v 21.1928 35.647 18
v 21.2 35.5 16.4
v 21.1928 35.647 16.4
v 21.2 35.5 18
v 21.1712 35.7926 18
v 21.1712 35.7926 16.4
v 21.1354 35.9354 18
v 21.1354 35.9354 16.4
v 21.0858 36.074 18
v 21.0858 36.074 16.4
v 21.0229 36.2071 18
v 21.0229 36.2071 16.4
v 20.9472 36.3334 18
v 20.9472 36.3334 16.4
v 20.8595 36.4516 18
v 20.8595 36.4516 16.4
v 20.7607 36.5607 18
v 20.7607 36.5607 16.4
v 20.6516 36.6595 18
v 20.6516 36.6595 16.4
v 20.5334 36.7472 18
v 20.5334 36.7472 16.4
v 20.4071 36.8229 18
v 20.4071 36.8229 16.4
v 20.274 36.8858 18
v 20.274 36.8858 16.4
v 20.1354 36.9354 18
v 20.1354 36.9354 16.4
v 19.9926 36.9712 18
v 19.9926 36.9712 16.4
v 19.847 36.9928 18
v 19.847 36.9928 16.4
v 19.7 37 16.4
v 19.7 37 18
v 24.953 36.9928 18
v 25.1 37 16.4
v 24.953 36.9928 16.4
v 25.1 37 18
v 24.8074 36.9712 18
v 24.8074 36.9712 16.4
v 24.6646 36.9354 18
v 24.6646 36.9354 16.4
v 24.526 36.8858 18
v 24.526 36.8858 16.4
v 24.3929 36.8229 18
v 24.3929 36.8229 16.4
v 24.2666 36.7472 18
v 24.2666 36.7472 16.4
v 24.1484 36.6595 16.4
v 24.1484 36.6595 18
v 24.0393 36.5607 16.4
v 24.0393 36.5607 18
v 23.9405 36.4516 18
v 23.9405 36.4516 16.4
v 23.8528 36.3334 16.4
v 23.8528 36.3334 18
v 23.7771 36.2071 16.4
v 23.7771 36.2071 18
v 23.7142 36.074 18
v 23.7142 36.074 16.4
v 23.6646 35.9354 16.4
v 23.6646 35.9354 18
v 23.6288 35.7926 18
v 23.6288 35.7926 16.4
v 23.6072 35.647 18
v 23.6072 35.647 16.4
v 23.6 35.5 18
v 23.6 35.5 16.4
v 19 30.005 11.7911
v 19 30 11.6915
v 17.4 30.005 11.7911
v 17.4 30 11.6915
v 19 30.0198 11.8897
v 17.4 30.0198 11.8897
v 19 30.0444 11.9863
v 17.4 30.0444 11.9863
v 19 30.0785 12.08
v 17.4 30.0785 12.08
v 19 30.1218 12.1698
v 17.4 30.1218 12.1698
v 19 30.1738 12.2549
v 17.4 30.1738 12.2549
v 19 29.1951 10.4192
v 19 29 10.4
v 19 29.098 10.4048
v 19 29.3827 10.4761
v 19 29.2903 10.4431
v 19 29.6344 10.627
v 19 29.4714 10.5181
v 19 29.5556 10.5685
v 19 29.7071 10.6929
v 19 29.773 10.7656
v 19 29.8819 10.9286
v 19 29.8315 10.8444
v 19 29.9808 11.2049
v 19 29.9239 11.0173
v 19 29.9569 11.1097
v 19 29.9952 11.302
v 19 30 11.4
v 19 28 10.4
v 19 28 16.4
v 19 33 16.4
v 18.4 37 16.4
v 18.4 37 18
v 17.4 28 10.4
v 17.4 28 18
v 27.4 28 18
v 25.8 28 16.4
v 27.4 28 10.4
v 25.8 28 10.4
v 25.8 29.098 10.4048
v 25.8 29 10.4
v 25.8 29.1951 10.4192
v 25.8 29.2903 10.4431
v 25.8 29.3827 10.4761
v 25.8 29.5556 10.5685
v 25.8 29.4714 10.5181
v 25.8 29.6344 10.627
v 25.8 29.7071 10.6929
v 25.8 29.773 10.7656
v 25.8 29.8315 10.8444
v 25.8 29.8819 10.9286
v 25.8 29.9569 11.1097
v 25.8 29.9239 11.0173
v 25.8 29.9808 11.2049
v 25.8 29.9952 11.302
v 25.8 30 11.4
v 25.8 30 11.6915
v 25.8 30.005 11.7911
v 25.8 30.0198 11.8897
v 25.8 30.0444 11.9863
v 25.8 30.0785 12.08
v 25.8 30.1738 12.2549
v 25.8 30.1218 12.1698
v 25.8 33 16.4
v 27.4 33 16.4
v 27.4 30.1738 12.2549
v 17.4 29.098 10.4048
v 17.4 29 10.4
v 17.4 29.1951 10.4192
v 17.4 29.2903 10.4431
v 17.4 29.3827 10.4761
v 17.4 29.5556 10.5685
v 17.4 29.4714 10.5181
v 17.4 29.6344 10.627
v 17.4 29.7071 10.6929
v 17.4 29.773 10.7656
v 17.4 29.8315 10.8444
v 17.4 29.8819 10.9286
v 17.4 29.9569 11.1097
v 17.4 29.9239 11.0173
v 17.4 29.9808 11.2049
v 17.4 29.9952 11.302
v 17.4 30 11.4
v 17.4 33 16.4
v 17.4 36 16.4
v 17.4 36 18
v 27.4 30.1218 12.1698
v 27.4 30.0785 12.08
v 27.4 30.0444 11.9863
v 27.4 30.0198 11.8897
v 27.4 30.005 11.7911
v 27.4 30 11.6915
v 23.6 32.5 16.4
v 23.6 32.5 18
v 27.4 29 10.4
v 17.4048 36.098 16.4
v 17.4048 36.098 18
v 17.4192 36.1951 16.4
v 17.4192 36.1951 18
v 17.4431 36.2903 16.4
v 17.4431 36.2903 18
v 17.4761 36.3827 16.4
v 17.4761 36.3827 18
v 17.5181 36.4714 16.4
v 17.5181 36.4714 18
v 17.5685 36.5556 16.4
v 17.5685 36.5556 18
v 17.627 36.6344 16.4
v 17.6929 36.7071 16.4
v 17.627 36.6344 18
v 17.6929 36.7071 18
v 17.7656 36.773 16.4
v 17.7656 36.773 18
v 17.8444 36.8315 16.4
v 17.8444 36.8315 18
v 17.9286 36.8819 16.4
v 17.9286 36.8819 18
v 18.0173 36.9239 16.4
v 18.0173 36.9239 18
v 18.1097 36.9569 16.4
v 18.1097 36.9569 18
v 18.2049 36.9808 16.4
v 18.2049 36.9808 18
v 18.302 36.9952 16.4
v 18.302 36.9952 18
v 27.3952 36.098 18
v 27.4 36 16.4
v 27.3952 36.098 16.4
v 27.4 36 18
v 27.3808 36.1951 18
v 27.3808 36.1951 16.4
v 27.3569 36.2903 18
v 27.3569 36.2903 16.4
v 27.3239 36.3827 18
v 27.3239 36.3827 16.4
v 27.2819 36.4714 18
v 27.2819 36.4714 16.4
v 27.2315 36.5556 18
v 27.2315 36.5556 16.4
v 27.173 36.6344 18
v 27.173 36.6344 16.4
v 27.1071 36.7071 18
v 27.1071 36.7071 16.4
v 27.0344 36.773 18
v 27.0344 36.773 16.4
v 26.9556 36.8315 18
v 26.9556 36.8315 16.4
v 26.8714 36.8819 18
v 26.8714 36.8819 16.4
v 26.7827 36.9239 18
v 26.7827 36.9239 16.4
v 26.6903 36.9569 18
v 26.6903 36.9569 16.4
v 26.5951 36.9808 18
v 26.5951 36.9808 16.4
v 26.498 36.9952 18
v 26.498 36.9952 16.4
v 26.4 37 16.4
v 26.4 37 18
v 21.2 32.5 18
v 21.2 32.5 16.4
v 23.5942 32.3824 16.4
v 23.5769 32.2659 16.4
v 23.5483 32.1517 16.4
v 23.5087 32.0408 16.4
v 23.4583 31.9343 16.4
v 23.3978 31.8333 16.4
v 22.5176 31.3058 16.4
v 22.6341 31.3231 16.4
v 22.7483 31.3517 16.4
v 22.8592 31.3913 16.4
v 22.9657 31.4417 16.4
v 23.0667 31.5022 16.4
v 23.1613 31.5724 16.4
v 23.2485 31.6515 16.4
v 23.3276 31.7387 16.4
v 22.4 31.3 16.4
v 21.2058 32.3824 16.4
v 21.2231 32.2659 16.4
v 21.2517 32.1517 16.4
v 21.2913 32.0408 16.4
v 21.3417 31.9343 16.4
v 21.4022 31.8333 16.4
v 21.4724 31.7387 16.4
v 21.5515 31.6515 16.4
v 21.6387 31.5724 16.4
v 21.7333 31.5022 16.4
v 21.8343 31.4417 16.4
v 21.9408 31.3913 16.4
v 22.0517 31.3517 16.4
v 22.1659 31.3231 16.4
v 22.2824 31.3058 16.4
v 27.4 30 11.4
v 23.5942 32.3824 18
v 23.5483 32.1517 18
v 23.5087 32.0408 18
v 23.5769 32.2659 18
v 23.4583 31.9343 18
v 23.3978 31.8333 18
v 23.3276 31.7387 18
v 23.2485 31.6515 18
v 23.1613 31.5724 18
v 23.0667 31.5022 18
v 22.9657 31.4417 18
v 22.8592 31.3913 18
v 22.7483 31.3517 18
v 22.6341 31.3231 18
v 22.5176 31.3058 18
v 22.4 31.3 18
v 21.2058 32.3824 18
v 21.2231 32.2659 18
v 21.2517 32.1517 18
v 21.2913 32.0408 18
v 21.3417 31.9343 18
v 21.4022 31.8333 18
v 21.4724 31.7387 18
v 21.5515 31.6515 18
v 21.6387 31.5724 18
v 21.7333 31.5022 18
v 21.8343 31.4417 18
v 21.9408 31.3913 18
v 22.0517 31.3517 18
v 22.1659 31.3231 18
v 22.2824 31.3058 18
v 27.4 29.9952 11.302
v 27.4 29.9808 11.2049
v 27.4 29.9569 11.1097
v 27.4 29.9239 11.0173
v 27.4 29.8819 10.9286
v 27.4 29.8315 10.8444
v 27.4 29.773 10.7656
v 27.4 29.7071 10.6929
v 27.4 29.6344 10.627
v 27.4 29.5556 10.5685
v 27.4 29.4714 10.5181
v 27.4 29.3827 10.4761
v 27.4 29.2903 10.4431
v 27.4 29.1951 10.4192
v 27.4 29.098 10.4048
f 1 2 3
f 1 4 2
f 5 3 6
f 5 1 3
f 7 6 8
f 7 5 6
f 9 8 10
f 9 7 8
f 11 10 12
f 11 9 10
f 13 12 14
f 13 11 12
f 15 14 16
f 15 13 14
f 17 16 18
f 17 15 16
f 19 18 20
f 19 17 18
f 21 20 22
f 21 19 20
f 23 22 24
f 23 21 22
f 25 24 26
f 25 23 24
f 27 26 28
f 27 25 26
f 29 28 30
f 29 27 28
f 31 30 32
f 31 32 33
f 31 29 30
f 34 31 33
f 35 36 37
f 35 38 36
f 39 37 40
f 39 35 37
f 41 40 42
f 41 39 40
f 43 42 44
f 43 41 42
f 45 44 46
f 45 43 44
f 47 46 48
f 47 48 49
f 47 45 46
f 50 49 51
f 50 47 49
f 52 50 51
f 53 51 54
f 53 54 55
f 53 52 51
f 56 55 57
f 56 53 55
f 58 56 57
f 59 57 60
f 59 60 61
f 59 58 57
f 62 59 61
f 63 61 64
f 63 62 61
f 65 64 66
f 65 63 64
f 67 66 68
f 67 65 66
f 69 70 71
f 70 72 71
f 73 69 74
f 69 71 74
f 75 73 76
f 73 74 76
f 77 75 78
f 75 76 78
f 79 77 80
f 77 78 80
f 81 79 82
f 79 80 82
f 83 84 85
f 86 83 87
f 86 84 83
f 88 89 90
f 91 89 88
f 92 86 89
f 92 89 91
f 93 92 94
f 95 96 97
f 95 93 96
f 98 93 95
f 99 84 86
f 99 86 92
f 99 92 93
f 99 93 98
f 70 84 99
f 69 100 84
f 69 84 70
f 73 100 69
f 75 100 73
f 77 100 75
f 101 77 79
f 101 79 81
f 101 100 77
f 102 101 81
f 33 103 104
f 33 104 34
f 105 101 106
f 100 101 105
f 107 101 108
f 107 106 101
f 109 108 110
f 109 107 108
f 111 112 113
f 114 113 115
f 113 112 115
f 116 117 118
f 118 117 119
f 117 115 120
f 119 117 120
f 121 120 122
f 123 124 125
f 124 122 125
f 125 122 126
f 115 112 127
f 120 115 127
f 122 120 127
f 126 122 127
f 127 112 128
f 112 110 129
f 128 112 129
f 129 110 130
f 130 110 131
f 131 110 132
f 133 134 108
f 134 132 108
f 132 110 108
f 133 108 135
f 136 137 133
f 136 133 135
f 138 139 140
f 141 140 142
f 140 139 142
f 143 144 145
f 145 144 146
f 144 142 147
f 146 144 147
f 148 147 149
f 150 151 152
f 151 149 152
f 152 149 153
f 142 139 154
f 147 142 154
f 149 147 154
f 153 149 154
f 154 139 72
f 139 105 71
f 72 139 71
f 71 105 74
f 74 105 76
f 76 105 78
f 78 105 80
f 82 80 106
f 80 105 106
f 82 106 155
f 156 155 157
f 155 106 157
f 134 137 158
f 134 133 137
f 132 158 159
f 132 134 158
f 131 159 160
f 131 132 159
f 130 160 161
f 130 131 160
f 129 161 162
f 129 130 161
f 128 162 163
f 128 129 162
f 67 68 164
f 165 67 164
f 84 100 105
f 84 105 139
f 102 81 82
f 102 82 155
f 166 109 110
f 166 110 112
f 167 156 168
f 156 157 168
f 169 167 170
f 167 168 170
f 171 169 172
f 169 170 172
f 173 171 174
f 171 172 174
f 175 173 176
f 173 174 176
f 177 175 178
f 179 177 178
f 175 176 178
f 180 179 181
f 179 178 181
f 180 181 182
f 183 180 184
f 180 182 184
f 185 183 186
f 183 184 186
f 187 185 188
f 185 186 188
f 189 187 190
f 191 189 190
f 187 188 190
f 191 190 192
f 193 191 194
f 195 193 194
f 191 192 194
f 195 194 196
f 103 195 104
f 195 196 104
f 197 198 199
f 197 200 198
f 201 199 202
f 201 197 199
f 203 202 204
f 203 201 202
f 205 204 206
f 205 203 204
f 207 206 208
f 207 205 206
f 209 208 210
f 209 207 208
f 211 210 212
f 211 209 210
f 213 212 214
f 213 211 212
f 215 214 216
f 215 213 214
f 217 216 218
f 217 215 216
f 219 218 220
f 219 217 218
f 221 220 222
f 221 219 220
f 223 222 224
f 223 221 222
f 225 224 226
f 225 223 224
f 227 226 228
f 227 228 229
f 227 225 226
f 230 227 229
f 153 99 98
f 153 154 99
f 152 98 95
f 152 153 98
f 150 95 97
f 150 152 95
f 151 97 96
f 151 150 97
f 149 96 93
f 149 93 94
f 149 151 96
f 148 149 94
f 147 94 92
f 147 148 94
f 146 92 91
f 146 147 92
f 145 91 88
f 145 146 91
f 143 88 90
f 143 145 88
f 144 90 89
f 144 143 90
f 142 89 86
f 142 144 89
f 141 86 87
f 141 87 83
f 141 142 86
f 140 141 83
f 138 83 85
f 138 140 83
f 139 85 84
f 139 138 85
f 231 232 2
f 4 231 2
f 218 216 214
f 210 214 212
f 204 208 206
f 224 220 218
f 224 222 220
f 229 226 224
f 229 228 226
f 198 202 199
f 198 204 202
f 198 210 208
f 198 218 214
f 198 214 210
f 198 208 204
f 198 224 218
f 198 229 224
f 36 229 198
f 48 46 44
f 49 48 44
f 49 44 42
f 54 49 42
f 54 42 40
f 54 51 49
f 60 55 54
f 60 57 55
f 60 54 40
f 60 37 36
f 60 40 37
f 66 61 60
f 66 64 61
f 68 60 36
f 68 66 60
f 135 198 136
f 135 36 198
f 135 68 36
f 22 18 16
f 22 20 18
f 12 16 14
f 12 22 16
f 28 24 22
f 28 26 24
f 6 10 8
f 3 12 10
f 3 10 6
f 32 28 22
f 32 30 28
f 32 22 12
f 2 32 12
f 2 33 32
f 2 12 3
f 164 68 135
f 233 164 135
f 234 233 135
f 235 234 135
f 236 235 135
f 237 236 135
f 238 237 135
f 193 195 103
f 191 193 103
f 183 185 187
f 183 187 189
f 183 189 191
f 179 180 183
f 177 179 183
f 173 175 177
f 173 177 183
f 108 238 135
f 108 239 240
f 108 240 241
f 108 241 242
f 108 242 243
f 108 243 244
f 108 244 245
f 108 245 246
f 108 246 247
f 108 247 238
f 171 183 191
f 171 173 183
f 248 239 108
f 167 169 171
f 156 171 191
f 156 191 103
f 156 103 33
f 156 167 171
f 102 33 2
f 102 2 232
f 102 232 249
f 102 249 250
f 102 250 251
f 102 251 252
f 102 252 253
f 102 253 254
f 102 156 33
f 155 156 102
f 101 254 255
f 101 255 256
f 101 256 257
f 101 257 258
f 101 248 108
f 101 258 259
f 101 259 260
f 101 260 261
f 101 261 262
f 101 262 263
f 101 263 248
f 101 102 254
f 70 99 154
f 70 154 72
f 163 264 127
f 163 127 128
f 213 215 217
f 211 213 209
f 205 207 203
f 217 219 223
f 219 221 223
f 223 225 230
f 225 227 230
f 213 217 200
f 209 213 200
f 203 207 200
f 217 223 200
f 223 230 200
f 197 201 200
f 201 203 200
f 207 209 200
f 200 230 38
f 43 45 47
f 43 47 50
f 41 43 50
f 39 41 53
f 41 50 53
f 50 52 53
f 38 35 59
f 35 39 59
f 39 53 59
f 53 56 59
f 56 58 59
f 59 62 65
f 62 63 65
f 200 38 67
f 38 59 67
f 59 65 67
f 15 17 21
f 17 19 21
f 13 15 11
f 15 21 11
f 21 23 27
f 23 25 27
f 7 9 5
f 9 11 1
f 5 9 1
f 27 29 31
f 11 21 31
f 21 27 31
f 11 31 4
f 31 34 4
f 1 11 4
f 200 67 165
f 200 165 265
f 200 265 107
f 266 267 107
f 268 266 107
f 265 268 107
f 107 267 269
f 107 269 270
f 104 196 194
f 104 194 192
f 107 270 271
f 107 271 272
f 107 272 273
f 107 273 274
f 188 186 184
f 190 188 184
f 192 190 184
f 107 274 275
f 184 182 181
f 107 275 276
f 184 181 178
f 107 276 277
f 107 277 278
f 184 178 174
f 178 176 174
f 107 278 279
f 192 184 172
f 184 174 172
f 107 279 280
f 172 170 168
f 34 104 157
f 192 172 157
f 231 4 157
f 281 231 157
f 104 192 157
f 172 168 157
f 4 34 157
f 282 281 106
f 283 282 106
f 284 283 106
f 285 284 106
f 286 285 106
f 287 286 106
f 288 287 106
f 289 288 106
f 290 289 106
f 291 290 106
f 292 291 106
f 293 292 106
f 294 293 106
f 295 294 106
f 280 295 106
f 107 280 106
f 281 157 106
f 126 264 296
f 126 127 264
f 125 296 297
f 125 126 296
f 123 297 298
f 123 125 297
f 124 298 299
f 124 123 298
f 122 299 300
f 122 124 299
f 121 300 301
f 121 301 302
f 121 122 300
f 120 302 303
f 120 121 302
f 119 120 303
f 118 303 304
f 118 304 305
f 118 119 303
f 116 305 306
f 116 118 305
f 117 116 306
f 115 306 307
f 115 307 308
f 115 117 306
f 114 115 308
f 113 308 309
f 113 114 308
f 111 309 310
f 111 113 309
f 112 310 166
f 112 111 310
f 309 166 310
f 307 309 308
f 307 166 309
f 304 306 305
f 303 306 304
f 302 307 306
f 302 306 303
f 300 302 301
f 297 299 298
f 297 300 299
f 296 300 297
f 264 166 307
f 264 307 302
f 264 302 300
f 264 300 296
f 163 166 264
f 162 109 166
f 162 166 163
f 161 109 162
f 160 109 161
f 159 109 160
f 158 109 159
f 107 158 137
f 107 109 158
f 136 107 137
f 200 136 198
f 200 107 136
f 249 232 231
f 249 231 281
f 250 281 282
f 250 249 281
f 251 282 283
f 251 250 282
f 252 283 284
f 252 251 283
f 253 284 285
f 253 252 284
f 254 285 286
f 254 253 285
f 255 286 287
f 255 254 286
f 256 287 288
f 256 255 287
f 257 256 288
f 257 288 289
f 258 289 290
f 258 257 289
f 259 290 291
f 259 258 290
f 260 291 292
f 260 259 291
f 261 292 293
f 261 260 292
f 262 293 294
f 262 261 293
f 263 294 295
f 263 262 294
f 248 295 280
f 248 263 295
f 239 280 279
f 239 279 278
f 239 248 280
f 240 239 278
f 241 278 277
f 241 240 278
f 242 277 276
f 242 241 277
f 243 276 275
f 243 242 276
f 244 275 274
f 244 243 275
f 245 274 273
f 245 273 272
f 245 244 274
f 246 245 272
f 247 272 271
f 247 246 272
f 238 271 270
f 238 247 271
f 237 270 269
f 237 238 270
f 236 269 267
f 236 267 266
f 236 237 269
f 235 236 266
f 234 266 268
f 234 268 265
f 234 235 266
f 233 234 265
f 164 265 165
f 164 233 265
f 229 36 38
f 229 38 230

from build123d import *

# Parameters (mm, degrees)
PAD078_DEPTH            = 1.6
PAD079_DEPTH            = 1.6
LINEARPATTERN001_COUNT  = 2
LINEARPATTERN001_PITCH  = 8.4
FILLET004_R             = 1
FILLET005_R             = 1
FILLET006_R             = 1
FILLET007_R             = 1.5
BODY025_PLACEMENT_ANGLE = 90


with BuildPart() as part:
    # Sketch108 → Pad078 (new body)
    with BuildSketch(Plane.XY):
        with BuildLine():
            Line((-4.5, 5), (4.5, 5))
            Line((4.5, 5), (4.5, 1.2))
            Line((0, 1.2), (4.5, 1.2))
            ThreePointArc((0, 1.2), (-1.2, 0), (0, -1.2))
            Line((4.5, -1.2), (0, -1.2))
            Line((4.5, -1.2), (4.5, -5))
            Line((4.5, -5), (-4.5, -5))
            Line((-4.5, -5), (-4.5, 5))
        make_face()
    extrude(amount=PAD078_DEPTH)

    # Sketch109 (on DatumPlane) → Pad079 (join)
    with BuildSketch(Plane.XZ.offset(5)):
        Polygon((-4.5, 0), (-4.5, -6), (-2.5, -6), (-2.5, -4.4), (0.5, 0), align=None)
    pad079 = extrude(amount=-PAD079_DEPTH)

    # LinearPattern001: Pad079 ×2
    with Locations(*[(0, i * LINEARPATTERN001_PITCH, 0) for i in range(1, LINEARPATTERN001_COUNT)]):
        add(pad079)

    # Fillet004
    fillet004_edges = [part.edges().sort_by_distance(p)[0] for p in [
        (-2.5, -4.2, -6),
        (-2.5, 4.2, -6),
    ]]
    fillet(fillet004_edges, radius=FILLET004_R)

    # Fillet005
    fillet005_edges = [part.edges().sort_by_distance(p)[0] for p in [
        (-2.5, -4.2, -4.4),
        (-2.5, 4.2, -4.4),
    ]]
    fillet(fillet005_edges, radius=FILLET005_R)

    # Fillet006
    fillet006_edges = [part.edges().sort_by_distance(p)[0] for p in [
        (4.5, -5, 0.8),
        (4.5, 5, 0.8),
    ]]
    fillet(fillet006_edges, radius=FILLET006_R)

    # Fillet007
    fillet007_edges = [part.edges().sort_by_distance(p)[0] for p in [
        (4.5, -1.2, 0.8),
        (4.5, 1.2, 0.8),
    ]]
    fillet(fillet007_edges, radius=FILLET007_R)


with BuildPart() as part_1:
    # Body025 placement: moved
    add(part.part.moved(Location((22.4, 32.5, 16.4))).rotate(Axis((22.4, 32.5, 16.4), (0, 0, 1)), BODY025_PLACEMENT_ANGLE))


solid = part_1.part
